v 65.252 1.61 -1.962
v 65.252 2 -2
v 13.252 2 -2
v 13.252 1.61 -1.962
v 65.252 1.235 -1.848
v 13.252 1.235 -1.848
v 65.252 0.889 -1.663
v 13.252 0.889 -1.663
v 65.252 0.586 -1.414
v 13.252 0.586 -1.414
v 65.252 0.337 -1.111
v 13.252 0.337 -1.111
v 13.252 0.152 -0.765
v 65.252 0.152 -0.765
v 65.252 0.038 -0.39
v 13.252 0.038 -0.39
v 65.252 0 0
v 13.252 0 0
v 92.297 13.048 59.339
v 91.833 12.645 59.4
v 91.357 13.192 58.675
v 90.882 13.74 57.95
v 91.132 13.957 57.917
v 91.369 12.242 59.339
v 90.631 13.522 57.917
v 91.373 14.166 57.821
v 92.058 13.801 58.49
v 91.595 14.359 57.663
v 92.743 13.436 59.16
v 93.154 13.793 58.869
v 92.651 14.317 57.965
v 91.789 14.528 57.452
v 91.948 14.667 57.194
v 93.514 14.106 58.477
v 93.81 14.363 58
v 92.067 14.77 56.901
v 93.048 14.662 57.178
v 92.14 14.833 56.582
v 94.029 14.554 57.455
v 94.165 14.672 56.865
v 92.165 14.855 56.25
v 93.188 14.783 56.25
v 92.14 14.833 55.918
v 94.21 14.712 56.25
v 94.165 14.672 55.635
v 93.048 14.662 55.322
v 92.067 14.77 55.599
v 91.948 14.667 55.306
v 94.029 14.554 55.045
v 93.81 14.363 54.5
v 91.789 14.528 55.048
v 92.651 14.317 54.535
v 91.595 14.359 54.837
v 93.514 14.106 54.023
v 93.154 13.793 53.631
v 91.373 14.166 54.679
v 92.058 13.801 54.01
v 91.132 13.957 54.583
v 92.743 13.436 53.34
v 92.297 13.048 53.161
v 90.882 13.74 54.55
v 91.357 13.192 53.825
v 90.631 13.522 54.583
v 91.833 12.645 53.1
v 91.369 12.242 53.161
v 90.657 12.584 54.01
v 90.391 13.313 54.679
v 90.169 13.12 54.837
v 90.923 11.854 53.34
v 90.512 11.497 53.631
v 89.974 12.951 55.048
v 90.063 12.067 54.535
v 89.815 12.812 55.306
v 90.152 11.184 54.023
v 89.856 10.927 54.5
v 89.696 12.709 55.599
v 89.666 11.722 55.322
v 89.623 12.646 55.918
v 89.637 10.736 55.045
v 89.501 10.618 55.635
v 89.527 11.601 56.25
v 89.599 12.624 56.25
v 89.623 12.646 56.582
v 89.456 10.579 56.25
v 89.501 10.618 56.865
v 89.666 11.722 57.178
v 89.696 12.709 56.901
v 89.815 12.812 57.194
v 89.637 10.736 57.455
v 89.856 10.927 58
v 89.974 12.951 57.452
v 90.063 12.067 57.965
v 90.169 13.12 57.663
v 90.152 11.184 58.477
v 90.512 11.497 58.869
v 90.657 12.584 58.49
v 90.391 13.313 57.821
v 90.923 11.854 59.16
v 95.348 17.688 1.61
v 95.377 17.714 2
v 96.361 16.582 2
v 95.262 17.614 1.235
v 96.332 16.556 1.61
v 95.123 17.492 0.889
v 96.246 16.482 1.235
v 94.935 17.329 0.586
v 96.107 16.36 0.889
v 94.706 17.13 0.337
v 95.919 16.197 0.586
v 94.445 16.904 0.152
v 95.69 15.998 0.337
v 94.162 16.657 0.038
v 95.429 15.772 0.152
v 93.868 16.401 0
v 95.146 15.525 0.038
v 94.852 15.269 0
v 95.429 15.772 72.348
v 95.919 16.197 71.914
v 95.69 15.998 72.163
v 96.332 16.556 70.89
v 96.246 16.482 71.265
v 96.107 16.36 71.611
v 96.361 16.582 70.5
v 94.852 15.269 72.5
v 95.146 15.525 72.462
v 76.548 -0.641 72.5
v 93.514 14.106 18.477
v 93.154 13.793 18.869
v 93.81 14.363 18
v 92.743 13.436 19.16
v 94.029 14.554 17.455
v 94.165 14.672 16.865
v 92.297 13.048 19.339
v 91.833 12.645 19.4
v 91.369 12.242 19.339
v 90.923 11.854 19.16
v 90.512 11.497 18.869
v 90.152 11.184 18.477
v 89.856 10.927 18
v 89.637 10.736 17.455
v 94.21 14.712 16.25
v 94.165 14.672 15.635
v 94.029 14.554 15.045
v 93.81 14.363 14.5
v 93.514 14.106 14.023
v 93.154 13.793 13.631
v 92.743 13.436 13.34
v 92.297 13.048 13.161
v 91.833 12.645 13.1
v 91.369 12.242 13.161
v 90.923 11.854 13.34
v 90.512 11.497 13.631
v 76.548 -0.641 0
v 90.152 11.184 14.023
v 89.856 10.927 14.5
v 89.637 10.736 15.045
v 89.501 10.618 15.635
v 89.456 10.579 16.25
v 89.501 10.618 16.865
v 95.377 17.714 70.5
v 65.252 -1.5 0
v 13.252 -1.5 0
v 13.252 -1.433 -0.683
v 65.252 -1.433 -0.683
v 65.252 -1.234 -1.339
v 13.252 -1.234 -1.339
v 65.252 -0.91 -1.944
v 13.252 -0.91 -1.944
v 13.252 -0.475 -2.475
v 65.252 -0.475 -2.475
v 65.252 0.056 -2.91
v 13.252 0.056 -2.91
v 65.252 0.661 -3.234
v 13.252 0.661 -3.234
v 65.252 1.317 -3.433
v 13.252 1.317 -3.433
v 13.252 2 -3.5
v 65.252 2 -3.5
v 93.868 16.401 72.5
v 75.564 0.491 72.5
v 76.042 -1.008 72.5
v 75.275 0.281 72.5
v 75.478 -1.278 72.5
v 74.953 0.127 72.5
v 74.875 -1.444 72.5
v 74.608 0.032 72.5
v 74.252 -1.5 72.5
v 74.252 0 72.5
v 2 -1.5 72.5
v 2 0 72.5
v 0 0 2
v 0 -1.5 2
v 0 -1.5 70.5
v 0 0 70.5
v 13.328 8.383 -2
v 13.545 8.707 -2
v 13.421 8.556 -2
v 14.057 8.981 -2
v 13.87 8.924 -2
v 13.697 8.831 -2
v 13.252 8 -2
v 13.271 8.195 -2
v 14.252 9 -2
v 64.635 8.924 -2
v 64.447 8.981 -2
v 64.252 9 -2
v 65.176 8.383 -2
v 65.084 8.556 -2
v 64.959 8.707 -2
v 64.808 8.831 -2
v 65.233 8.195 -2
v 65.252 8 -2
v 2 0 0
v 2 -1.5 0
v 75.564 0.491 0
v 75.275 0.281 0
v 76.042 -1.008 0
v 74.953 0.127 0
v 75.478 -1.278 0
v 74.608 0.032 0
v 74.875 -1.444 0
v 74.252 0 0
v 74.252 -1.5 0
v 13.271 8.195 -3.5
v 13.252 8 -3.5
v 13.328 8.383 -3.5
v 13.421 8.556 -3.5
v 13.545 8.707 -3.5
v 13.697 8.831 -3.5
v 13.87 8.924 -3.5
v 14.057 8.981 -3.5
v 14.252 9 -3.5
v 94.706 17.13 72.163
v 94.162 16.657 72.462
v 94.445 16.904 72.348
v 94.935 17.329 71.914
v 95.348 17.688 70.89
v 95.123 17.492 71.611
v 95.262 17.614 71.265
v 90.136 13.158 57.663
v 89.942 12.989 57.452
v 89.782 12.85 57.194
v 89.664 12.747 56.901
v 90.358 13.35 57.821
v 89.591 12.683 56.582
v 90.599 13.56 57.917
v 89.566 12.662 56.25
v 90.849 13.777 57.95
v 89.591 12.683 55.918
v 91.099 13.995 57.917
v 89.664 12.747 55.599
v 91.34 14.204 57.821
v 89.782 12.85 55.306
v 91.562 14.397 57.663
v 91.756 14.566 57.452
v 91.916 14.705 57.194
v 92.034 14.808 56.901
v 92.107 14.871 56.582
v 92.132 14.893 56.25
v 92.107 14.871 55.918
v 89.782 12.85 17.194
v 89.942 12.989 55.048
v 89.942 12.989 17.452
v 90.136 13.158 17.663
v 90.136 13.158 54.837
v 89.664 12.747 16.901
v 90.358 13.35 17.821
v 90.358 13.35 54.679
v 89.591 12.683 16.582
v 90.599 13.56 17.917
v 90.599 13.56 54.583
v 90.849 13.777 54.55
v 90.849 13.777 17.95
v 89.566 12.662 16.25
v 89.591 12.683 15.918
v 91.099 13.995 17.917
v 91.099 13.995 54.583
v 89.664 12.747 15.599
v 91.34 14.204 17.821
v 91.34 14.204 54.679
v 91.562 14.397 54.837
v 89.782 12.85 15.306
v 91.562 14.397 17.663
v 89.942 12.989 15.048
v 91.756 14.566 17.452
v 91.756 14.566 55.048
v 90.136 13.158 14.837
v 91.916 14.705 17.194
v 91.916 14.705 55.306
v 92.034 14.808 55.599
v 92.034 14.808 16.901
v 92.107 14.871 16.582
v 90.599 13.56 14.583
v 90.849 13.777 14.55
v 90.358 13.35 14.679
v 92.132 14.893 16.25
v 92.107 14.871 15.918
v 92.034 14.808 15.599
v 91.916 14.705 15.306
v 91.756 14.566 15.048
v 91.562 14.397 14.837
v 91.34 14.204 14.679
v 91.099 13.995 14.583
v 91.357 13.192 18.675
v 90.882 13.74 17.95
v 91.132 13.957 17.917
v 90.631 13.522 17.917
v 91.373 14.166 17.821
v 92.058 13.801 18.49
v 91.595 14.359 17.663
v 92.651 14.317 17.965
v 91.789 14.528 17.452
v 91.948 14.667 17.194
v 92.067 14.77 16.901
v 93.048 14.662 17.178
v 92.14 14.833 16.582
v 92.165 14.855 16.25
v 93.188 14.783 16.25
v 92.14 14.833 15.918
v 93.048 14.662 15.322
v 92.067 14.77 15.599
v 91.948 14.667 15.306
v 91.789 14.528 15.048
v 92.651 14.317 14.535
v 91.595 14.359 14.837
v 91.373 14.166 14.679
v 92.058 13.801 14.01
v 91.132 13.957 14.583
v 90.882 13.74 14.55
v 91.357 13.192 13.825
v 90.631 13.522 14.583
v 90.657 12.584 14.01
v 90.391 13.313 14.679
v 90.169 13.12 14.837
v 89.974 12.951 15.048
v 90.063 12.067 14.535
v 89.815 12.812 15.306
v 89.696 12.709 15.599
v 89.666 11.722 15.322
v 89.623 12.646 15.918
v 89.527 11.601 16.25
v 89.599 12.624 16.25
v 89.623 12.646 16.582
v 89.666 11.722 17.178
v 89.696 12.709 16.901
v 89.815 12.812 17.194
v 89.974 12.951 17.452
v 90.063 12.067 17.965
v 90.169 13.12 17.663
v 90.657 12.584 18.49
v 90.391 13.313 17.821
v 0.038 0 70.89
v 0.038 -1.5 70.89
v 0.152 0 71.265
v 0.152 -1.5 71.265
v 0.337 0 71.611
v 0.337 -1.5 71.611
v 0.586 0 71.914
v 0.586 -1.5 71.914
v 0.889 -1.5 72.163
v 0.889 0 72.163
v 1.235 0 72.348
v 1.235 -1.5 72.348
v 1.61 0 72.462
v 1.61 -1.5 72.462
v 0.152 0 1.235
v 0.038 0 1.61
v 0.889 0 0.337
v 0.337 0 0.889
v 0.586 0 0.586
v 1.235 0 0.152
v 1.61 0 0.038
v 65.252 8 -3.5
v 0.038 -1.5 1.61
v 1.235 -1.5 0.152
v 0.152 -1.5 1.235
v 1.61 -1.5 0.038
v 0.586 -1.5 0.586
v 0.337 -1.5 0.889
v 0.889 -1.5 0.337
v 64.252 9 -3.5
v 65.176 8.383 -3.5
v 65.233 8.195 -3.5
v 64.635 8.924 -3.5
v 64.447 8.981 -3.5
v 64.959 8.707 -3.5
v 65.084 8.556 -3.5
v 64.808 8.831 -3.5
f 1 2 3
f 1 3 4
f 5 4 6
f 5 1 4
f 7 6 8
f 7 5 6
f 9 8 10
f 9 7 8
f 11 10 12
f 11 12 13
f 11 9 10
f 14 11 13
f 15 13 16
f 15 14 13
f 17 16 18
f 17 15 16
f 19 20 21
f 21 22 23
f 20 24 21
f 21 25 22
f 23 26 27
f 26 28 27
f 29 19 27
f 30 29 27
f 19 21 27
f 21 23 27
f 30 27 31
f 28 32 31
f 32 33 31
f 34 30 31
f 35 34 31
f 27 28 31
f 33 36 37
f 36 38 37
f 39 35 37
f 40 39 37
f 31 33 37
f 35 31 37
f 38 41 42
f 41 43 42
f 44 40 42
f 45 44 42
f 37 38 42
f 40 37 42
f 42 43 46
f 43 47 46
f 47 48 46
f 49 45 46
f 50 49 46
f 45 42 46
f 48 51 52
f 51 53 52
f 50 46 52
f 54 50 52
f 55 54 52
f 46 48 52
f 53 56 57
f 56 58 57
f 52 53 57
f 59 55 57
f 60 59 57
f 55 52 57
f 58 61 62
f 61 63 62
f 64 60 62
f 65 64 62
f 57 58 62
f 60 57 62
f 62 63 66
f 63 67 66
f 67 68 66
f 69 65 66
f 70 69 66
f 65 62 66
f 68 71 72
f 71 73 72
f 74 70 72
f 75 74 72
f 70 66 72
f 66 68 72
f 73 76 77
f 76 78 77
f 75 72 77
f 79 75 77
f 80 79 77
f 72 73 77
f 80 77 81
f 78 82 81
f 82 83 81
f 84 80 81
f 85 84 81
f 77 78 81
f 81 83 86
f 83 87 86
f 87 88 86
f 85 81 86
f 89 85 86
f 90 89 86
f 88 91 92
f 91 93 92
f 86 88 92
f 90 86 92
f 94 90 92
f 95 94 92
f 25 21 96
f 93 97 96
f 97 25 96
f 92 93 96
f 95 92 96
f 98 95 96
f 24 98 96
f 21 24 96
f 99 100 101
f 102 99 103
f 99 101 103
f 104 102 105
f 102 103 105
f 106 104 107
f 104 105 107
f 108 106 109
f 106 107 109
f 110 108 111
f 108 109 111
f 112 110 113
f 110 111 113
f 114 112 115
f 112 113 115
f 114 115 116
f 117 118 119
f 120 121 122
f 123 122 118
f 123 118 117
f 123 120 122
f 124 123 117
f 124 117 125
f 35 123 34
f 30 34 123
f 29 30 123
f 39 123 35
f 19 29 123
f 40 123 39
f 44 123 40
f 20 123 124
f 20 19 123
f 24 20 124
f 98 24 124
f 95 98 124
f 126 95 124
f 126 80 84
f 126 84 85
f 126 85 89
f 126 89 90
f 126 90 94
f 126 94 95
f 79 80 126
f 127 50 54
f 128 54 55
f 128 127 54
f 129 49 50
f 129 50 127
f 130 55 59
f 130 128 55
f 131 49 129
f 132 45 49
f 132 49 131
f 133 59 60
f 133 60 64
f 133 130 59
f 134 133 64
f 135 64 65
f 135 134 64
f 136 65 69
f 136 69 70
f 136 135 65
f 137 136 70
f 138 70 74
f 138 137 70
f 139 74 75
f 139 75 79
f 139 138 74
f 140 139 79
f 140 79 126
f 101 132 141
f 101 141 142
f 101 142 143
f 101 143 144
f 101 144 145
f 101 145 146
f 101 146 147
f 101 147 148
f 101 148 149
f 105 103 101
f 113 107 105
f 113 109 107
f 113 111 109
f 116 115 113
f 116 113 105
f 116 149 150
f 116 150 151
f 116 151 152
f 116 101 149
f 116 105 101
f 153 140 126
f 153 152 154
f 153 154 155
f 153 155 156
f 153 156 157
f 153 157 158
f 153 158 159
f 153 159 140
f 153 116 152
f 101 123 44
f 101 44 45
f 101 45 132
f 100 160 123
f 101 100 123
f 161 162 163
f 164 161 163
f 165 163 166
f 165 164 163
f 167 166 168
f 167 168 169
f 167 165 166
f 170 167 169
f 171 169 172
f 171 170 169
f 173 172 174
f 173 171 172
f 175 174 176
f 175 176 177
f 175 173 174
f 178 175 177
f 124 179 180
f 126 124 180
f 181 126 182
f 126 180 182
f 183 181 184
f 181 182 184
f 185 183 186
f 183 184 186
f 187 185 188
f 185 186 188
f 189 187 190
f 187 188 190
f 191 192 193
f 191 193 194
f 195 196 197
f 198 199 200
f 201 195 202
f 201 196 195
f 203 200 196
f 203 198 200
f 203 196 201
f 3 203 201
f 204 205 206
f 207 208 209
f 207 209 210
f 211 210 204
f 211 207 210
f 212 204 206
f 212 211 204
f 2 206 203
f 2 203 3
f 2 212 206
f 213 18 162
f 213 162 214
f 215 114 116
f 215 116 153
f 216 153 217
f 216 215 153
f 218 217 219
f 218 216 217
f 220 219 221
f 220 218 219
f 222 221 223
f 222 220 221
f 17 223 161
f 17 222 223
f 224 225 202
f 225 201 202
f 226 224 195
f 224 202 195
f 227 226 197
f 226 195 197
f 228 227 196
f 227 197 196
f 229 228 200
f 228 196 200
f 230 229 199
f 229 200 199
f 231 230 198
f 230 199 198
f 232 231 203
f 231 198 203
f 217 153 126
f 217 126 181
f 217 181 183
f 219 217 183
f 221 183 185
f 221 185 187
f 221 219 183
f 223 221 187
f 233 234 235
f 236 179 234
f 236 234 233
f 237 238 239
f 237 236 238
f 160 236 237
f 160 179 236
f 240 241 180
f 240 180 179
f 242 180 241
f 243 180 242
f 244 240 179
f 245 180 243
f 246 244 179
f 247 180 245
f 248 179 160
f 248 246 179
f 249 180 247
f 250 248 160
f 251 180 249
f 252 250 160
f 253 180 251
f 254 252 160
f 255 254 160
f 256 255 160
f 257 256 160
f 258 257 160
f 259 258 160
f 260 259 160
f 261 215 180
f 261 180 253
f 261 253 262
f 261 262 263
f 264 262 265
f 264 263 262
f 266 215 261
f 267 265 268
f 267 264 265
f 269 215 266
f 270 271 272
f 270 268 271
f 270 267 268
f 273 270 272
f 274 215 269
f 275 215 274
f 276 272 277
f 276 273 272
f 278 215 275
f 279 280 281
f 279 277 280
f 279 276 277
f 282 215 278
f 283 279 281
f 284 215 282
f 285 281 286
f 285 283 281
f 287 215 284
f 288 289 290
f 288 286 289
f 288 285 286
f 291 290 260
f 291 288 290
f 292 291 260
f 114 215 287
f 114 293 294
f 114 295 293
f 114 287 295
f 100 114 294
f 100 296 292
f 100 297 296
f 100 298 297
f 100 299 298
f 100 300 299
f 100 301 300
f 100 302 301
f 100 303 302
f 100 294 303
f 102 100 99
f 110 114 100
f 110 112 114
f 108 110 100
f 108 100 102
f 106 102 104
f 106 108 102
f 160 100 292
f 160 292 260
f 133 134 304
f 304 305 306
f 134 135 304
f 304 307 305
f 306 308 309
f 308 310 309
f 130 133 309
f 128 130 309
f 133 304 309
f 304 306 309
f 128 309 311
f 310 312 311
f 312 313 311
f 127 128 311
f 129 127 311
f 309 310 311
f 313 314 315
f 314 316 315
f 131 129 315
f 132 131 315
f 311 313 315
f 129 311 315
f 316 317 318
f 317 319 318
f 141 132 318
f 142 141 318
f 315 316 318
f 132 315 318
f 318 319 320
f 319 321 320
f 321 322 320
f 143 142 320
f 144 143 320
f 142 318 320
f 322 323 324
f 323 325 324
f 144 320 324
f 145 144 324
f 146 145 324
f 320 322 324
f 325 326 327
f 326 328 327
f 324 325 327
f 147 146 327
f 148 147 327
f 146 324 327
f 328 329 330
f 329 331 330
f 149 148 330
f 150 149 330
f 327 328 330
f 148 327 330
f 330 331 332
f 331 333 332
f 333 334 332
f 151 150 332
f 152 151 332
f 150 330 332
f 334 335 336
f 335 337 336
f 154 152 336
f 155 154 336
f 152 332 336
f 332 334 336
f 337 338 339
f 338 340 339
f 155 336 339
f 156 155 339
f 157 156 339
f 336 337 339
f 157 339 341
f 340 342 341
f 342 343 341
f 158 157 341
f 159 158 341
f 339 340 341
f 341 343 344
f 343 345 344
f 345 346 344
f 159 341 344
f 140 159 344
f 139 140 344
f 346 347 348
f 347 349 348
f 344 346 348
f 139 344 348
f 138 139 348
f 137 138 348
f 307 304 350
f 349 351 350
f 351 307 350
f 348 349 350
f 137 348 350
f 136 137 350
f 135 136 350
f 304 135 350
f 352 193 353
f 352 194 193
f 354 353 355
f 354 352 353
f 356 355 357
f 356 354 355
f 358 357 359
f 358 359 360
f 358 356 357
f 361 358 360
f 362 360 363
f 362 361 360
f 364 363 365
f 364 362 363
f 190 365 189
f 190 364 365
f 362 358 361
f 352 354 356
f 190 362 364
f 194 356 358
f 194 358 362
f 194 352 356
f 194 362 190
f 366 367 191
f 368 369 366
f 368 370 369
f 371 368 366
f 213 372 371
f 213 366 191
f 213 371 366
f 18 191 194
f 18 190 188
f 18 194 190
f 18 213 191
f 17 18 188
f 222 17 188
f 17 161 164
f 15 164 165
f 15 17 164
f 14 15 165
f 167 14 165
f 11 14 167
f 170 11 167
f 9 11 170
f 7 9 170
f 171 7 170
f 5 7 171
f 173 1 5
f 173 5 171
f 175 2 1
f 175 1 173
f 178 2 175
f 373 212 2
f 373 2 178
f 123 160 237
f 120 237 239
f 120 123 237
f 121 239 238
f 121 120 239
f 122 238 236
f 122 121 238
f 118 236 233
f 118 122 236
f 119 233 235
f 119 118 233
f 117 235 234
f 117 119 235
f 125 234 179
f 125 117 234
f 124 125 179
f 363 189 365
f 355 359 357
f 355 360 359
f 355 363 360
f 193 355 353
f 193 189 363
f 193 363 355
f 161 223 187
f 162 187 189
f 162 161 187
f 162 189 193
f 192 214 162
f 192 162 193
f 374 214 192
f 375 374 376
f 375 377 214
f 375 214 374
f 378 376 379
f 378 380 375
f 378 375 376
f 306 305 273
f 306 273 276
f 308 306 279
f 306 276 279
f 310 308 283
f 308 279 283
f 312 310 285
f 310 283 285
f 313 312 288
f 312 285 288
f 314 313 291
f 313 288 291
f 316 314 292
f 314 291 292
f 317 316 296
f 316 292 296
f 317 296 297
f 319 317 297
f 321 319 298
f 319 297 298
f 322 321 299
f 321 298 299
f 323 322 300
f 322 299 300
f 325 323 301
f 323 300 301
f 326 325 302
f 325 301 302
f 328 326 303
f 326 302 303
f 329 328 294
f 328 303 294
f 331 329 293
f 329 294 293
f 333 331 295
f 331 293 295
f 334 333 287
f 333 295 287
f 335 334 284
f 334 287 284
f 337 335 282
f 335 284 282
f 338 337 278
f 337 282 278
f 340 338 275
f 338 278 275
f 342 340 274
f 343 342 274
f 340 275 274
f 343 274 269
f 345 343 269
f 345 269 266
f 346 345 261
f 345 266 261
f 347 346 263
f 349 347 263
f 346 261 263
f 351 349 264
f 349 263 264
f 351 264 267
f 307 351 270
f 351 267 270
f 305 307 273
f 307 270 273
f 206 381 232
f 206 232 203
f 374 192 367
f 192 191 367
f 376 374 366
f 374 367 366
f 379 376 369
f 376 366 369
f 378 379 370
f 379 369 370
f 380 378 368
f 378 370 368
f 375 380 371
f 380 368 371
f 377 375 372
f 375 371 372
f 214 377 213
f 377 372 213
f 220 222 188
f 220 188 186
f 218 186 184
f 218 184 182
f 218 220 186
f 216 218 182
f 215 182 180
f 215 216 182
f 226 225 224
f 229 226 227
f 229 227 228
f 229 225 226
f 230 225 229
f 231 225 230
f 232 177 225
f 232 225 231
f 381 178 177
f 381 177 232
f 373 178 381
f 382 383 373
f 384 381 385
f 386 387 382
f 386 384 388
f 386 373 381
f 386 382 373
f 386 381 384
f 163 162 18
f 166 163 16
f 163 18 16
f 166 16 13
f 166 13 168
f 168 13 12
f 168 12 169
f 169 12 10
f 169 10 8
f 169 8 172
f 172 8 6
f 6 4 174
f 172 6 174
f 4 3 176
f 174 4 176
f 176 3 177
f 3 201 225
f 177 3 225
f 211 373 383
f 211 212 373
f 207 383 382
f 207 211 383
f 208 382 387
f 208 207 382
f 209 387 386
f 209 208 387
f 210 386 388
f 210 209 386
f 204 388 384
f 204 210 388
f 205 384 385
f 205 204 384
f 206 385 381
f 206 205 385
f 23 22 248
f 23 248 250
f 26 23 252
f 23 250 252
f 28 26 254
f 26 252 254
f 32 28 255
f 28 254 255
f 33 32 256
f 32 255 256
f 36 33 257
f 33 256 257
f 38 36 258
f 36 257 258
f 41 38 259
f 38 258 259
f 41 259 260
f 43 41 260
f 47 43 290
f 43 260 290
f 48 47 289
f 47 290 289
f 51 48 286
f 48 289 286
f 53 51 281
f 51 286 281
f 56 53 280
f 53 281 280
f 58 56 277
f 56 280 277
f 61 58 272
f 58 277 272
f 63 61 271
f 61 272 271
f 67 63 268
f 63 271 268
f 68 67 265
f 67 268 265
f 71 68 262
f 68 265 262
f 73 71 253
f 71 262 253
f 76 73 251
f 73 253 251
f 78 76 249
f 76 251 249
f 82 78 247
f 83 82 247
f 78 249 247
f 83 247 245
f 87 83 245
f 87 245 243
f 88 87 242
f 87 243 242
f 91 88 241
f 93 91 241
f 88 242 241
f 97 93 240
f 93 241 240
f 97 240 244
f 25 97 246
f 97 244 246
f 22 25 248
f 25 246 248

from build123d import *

# Parameters (mm, degrees)
T_LE_DE_BASE_PLI_E1_DEPTH                      = 72.5
CONG_1_R                                       = 2
FRAISAGE_POUR_VIS_T_TE_FRAIS_E_M31_D           = 3.4
FRAISAGE_POUR_VIS_T_TE_FRAIS_E_M31_CSINK_D     = 6.3
FRAISAGE_POUR_VIS_T_TE_FRAIS_E_M31_CSINK_ANGLE = 90
T_LE_PLI_E_SUR_AR_TE1_DEPTH                    = 52
CONG_2_R                                       = 1


# Sheet-metal steps are written as plain solids
with BuildPart() as part:
    # Esquisse1 → Tôle de base pliée1 (new body)
    with BuildSketch(Plane.XY):
        with BuildLine():
            Line((0, 0), (74.252230641, 0))
            ThreePointArc((74.252230641, 0), (74.952645404, 0.126655622), (75.564348699, 0.49058084))
            Line((75.564348699, 0.49058084), (95.377158666, 17.713593783))
            Line((95.377158666, 17.713593783), (96.36124721, 16.581529412))
            Line((96.36124721, 16.581529412), (76.548437242, -0.641483531))
            ThreePointArc((76.548437242, -0.641483531), (75.477956475, -1.278352662), (74.252230641, -1.5))
            Line((74.252230641, -1.5), (0, -1.5))
            Line((0, -1.5), (0, 0))
        make_face()
    extrude(amount=T_LE_DE_BASE_PLI_E1_DEPTH)

    # Congé1
    cong_1_edges = [part.edges().sort_by_distance(p)[0] for p in [
        (0, -0.75, 72.5),
        (95.869202938, 17.147561598, 72.5),
        (0, -0.75, 0),
        (95.869202938, 17.147561598, 0),
    ]]
    fillet(cong_1_edges, radius=CONG_1_R)

    # Fraisage pour vis à tête fraisée M31 (through all)
    with Locations(Plane(origin=(33.265097257, -38.267116948, 0), x_dir=(0, 0, -1), z_dir=(0.6560590289905085, -0.7547095802227711, 0))):
        with Locations((-56.25, 77.603218517), (-16.25, 77.603218517)):
            CounterSinkHole(FRAISAGE_POUR_VIS_T_TE_FRAIS_E_M31_D / 2, FRAISAGE_POUR_VIS_T_TE_FRAIS_E_M31_CSINK_D / 2, counter_sink_angle=FRAISAGE_POUR_VIS_T_TE_FRAIS_E_M31_CSINK_ANGLE)

    # Tôle pliée sur arête1 section (across the edge) → Tôle pliée sur arête1 (add)
    with BuildSketch(Plane(origin=(65.252230641, 0, -2), x_dir=(0, 0, 1), z_dir=(-1, 0, 0))):
        with BuildLine():
            Line((-1.5, 2), (-1.5, 9))
            Line((-1.5, 9), (0, 9))
            Line((0, 9), (0, 2))
            ThreePointArc((0, 2), (0.585786438, 0.585786438), (2, 0))
            Line((2, 0), (2, -1.5))
            ThreePointArc((2, -1.5), (-0.474873734, -0.474873734), (-1.5, 2))
        make_face()
    extrude(amount=T_LE_PLI_E_SUR_AR_TE1_DEPTH)

    # Congé2
    cong_2_edges = [part.edges().sort_by_distance(p)[0] for p in [
        (65.252230641, 9, -2.75),
        (13.252230641, 9, -2.75),
    ]]
    fillet(cong_2_edges, radius=CONG_2_R)


solid = part.part
